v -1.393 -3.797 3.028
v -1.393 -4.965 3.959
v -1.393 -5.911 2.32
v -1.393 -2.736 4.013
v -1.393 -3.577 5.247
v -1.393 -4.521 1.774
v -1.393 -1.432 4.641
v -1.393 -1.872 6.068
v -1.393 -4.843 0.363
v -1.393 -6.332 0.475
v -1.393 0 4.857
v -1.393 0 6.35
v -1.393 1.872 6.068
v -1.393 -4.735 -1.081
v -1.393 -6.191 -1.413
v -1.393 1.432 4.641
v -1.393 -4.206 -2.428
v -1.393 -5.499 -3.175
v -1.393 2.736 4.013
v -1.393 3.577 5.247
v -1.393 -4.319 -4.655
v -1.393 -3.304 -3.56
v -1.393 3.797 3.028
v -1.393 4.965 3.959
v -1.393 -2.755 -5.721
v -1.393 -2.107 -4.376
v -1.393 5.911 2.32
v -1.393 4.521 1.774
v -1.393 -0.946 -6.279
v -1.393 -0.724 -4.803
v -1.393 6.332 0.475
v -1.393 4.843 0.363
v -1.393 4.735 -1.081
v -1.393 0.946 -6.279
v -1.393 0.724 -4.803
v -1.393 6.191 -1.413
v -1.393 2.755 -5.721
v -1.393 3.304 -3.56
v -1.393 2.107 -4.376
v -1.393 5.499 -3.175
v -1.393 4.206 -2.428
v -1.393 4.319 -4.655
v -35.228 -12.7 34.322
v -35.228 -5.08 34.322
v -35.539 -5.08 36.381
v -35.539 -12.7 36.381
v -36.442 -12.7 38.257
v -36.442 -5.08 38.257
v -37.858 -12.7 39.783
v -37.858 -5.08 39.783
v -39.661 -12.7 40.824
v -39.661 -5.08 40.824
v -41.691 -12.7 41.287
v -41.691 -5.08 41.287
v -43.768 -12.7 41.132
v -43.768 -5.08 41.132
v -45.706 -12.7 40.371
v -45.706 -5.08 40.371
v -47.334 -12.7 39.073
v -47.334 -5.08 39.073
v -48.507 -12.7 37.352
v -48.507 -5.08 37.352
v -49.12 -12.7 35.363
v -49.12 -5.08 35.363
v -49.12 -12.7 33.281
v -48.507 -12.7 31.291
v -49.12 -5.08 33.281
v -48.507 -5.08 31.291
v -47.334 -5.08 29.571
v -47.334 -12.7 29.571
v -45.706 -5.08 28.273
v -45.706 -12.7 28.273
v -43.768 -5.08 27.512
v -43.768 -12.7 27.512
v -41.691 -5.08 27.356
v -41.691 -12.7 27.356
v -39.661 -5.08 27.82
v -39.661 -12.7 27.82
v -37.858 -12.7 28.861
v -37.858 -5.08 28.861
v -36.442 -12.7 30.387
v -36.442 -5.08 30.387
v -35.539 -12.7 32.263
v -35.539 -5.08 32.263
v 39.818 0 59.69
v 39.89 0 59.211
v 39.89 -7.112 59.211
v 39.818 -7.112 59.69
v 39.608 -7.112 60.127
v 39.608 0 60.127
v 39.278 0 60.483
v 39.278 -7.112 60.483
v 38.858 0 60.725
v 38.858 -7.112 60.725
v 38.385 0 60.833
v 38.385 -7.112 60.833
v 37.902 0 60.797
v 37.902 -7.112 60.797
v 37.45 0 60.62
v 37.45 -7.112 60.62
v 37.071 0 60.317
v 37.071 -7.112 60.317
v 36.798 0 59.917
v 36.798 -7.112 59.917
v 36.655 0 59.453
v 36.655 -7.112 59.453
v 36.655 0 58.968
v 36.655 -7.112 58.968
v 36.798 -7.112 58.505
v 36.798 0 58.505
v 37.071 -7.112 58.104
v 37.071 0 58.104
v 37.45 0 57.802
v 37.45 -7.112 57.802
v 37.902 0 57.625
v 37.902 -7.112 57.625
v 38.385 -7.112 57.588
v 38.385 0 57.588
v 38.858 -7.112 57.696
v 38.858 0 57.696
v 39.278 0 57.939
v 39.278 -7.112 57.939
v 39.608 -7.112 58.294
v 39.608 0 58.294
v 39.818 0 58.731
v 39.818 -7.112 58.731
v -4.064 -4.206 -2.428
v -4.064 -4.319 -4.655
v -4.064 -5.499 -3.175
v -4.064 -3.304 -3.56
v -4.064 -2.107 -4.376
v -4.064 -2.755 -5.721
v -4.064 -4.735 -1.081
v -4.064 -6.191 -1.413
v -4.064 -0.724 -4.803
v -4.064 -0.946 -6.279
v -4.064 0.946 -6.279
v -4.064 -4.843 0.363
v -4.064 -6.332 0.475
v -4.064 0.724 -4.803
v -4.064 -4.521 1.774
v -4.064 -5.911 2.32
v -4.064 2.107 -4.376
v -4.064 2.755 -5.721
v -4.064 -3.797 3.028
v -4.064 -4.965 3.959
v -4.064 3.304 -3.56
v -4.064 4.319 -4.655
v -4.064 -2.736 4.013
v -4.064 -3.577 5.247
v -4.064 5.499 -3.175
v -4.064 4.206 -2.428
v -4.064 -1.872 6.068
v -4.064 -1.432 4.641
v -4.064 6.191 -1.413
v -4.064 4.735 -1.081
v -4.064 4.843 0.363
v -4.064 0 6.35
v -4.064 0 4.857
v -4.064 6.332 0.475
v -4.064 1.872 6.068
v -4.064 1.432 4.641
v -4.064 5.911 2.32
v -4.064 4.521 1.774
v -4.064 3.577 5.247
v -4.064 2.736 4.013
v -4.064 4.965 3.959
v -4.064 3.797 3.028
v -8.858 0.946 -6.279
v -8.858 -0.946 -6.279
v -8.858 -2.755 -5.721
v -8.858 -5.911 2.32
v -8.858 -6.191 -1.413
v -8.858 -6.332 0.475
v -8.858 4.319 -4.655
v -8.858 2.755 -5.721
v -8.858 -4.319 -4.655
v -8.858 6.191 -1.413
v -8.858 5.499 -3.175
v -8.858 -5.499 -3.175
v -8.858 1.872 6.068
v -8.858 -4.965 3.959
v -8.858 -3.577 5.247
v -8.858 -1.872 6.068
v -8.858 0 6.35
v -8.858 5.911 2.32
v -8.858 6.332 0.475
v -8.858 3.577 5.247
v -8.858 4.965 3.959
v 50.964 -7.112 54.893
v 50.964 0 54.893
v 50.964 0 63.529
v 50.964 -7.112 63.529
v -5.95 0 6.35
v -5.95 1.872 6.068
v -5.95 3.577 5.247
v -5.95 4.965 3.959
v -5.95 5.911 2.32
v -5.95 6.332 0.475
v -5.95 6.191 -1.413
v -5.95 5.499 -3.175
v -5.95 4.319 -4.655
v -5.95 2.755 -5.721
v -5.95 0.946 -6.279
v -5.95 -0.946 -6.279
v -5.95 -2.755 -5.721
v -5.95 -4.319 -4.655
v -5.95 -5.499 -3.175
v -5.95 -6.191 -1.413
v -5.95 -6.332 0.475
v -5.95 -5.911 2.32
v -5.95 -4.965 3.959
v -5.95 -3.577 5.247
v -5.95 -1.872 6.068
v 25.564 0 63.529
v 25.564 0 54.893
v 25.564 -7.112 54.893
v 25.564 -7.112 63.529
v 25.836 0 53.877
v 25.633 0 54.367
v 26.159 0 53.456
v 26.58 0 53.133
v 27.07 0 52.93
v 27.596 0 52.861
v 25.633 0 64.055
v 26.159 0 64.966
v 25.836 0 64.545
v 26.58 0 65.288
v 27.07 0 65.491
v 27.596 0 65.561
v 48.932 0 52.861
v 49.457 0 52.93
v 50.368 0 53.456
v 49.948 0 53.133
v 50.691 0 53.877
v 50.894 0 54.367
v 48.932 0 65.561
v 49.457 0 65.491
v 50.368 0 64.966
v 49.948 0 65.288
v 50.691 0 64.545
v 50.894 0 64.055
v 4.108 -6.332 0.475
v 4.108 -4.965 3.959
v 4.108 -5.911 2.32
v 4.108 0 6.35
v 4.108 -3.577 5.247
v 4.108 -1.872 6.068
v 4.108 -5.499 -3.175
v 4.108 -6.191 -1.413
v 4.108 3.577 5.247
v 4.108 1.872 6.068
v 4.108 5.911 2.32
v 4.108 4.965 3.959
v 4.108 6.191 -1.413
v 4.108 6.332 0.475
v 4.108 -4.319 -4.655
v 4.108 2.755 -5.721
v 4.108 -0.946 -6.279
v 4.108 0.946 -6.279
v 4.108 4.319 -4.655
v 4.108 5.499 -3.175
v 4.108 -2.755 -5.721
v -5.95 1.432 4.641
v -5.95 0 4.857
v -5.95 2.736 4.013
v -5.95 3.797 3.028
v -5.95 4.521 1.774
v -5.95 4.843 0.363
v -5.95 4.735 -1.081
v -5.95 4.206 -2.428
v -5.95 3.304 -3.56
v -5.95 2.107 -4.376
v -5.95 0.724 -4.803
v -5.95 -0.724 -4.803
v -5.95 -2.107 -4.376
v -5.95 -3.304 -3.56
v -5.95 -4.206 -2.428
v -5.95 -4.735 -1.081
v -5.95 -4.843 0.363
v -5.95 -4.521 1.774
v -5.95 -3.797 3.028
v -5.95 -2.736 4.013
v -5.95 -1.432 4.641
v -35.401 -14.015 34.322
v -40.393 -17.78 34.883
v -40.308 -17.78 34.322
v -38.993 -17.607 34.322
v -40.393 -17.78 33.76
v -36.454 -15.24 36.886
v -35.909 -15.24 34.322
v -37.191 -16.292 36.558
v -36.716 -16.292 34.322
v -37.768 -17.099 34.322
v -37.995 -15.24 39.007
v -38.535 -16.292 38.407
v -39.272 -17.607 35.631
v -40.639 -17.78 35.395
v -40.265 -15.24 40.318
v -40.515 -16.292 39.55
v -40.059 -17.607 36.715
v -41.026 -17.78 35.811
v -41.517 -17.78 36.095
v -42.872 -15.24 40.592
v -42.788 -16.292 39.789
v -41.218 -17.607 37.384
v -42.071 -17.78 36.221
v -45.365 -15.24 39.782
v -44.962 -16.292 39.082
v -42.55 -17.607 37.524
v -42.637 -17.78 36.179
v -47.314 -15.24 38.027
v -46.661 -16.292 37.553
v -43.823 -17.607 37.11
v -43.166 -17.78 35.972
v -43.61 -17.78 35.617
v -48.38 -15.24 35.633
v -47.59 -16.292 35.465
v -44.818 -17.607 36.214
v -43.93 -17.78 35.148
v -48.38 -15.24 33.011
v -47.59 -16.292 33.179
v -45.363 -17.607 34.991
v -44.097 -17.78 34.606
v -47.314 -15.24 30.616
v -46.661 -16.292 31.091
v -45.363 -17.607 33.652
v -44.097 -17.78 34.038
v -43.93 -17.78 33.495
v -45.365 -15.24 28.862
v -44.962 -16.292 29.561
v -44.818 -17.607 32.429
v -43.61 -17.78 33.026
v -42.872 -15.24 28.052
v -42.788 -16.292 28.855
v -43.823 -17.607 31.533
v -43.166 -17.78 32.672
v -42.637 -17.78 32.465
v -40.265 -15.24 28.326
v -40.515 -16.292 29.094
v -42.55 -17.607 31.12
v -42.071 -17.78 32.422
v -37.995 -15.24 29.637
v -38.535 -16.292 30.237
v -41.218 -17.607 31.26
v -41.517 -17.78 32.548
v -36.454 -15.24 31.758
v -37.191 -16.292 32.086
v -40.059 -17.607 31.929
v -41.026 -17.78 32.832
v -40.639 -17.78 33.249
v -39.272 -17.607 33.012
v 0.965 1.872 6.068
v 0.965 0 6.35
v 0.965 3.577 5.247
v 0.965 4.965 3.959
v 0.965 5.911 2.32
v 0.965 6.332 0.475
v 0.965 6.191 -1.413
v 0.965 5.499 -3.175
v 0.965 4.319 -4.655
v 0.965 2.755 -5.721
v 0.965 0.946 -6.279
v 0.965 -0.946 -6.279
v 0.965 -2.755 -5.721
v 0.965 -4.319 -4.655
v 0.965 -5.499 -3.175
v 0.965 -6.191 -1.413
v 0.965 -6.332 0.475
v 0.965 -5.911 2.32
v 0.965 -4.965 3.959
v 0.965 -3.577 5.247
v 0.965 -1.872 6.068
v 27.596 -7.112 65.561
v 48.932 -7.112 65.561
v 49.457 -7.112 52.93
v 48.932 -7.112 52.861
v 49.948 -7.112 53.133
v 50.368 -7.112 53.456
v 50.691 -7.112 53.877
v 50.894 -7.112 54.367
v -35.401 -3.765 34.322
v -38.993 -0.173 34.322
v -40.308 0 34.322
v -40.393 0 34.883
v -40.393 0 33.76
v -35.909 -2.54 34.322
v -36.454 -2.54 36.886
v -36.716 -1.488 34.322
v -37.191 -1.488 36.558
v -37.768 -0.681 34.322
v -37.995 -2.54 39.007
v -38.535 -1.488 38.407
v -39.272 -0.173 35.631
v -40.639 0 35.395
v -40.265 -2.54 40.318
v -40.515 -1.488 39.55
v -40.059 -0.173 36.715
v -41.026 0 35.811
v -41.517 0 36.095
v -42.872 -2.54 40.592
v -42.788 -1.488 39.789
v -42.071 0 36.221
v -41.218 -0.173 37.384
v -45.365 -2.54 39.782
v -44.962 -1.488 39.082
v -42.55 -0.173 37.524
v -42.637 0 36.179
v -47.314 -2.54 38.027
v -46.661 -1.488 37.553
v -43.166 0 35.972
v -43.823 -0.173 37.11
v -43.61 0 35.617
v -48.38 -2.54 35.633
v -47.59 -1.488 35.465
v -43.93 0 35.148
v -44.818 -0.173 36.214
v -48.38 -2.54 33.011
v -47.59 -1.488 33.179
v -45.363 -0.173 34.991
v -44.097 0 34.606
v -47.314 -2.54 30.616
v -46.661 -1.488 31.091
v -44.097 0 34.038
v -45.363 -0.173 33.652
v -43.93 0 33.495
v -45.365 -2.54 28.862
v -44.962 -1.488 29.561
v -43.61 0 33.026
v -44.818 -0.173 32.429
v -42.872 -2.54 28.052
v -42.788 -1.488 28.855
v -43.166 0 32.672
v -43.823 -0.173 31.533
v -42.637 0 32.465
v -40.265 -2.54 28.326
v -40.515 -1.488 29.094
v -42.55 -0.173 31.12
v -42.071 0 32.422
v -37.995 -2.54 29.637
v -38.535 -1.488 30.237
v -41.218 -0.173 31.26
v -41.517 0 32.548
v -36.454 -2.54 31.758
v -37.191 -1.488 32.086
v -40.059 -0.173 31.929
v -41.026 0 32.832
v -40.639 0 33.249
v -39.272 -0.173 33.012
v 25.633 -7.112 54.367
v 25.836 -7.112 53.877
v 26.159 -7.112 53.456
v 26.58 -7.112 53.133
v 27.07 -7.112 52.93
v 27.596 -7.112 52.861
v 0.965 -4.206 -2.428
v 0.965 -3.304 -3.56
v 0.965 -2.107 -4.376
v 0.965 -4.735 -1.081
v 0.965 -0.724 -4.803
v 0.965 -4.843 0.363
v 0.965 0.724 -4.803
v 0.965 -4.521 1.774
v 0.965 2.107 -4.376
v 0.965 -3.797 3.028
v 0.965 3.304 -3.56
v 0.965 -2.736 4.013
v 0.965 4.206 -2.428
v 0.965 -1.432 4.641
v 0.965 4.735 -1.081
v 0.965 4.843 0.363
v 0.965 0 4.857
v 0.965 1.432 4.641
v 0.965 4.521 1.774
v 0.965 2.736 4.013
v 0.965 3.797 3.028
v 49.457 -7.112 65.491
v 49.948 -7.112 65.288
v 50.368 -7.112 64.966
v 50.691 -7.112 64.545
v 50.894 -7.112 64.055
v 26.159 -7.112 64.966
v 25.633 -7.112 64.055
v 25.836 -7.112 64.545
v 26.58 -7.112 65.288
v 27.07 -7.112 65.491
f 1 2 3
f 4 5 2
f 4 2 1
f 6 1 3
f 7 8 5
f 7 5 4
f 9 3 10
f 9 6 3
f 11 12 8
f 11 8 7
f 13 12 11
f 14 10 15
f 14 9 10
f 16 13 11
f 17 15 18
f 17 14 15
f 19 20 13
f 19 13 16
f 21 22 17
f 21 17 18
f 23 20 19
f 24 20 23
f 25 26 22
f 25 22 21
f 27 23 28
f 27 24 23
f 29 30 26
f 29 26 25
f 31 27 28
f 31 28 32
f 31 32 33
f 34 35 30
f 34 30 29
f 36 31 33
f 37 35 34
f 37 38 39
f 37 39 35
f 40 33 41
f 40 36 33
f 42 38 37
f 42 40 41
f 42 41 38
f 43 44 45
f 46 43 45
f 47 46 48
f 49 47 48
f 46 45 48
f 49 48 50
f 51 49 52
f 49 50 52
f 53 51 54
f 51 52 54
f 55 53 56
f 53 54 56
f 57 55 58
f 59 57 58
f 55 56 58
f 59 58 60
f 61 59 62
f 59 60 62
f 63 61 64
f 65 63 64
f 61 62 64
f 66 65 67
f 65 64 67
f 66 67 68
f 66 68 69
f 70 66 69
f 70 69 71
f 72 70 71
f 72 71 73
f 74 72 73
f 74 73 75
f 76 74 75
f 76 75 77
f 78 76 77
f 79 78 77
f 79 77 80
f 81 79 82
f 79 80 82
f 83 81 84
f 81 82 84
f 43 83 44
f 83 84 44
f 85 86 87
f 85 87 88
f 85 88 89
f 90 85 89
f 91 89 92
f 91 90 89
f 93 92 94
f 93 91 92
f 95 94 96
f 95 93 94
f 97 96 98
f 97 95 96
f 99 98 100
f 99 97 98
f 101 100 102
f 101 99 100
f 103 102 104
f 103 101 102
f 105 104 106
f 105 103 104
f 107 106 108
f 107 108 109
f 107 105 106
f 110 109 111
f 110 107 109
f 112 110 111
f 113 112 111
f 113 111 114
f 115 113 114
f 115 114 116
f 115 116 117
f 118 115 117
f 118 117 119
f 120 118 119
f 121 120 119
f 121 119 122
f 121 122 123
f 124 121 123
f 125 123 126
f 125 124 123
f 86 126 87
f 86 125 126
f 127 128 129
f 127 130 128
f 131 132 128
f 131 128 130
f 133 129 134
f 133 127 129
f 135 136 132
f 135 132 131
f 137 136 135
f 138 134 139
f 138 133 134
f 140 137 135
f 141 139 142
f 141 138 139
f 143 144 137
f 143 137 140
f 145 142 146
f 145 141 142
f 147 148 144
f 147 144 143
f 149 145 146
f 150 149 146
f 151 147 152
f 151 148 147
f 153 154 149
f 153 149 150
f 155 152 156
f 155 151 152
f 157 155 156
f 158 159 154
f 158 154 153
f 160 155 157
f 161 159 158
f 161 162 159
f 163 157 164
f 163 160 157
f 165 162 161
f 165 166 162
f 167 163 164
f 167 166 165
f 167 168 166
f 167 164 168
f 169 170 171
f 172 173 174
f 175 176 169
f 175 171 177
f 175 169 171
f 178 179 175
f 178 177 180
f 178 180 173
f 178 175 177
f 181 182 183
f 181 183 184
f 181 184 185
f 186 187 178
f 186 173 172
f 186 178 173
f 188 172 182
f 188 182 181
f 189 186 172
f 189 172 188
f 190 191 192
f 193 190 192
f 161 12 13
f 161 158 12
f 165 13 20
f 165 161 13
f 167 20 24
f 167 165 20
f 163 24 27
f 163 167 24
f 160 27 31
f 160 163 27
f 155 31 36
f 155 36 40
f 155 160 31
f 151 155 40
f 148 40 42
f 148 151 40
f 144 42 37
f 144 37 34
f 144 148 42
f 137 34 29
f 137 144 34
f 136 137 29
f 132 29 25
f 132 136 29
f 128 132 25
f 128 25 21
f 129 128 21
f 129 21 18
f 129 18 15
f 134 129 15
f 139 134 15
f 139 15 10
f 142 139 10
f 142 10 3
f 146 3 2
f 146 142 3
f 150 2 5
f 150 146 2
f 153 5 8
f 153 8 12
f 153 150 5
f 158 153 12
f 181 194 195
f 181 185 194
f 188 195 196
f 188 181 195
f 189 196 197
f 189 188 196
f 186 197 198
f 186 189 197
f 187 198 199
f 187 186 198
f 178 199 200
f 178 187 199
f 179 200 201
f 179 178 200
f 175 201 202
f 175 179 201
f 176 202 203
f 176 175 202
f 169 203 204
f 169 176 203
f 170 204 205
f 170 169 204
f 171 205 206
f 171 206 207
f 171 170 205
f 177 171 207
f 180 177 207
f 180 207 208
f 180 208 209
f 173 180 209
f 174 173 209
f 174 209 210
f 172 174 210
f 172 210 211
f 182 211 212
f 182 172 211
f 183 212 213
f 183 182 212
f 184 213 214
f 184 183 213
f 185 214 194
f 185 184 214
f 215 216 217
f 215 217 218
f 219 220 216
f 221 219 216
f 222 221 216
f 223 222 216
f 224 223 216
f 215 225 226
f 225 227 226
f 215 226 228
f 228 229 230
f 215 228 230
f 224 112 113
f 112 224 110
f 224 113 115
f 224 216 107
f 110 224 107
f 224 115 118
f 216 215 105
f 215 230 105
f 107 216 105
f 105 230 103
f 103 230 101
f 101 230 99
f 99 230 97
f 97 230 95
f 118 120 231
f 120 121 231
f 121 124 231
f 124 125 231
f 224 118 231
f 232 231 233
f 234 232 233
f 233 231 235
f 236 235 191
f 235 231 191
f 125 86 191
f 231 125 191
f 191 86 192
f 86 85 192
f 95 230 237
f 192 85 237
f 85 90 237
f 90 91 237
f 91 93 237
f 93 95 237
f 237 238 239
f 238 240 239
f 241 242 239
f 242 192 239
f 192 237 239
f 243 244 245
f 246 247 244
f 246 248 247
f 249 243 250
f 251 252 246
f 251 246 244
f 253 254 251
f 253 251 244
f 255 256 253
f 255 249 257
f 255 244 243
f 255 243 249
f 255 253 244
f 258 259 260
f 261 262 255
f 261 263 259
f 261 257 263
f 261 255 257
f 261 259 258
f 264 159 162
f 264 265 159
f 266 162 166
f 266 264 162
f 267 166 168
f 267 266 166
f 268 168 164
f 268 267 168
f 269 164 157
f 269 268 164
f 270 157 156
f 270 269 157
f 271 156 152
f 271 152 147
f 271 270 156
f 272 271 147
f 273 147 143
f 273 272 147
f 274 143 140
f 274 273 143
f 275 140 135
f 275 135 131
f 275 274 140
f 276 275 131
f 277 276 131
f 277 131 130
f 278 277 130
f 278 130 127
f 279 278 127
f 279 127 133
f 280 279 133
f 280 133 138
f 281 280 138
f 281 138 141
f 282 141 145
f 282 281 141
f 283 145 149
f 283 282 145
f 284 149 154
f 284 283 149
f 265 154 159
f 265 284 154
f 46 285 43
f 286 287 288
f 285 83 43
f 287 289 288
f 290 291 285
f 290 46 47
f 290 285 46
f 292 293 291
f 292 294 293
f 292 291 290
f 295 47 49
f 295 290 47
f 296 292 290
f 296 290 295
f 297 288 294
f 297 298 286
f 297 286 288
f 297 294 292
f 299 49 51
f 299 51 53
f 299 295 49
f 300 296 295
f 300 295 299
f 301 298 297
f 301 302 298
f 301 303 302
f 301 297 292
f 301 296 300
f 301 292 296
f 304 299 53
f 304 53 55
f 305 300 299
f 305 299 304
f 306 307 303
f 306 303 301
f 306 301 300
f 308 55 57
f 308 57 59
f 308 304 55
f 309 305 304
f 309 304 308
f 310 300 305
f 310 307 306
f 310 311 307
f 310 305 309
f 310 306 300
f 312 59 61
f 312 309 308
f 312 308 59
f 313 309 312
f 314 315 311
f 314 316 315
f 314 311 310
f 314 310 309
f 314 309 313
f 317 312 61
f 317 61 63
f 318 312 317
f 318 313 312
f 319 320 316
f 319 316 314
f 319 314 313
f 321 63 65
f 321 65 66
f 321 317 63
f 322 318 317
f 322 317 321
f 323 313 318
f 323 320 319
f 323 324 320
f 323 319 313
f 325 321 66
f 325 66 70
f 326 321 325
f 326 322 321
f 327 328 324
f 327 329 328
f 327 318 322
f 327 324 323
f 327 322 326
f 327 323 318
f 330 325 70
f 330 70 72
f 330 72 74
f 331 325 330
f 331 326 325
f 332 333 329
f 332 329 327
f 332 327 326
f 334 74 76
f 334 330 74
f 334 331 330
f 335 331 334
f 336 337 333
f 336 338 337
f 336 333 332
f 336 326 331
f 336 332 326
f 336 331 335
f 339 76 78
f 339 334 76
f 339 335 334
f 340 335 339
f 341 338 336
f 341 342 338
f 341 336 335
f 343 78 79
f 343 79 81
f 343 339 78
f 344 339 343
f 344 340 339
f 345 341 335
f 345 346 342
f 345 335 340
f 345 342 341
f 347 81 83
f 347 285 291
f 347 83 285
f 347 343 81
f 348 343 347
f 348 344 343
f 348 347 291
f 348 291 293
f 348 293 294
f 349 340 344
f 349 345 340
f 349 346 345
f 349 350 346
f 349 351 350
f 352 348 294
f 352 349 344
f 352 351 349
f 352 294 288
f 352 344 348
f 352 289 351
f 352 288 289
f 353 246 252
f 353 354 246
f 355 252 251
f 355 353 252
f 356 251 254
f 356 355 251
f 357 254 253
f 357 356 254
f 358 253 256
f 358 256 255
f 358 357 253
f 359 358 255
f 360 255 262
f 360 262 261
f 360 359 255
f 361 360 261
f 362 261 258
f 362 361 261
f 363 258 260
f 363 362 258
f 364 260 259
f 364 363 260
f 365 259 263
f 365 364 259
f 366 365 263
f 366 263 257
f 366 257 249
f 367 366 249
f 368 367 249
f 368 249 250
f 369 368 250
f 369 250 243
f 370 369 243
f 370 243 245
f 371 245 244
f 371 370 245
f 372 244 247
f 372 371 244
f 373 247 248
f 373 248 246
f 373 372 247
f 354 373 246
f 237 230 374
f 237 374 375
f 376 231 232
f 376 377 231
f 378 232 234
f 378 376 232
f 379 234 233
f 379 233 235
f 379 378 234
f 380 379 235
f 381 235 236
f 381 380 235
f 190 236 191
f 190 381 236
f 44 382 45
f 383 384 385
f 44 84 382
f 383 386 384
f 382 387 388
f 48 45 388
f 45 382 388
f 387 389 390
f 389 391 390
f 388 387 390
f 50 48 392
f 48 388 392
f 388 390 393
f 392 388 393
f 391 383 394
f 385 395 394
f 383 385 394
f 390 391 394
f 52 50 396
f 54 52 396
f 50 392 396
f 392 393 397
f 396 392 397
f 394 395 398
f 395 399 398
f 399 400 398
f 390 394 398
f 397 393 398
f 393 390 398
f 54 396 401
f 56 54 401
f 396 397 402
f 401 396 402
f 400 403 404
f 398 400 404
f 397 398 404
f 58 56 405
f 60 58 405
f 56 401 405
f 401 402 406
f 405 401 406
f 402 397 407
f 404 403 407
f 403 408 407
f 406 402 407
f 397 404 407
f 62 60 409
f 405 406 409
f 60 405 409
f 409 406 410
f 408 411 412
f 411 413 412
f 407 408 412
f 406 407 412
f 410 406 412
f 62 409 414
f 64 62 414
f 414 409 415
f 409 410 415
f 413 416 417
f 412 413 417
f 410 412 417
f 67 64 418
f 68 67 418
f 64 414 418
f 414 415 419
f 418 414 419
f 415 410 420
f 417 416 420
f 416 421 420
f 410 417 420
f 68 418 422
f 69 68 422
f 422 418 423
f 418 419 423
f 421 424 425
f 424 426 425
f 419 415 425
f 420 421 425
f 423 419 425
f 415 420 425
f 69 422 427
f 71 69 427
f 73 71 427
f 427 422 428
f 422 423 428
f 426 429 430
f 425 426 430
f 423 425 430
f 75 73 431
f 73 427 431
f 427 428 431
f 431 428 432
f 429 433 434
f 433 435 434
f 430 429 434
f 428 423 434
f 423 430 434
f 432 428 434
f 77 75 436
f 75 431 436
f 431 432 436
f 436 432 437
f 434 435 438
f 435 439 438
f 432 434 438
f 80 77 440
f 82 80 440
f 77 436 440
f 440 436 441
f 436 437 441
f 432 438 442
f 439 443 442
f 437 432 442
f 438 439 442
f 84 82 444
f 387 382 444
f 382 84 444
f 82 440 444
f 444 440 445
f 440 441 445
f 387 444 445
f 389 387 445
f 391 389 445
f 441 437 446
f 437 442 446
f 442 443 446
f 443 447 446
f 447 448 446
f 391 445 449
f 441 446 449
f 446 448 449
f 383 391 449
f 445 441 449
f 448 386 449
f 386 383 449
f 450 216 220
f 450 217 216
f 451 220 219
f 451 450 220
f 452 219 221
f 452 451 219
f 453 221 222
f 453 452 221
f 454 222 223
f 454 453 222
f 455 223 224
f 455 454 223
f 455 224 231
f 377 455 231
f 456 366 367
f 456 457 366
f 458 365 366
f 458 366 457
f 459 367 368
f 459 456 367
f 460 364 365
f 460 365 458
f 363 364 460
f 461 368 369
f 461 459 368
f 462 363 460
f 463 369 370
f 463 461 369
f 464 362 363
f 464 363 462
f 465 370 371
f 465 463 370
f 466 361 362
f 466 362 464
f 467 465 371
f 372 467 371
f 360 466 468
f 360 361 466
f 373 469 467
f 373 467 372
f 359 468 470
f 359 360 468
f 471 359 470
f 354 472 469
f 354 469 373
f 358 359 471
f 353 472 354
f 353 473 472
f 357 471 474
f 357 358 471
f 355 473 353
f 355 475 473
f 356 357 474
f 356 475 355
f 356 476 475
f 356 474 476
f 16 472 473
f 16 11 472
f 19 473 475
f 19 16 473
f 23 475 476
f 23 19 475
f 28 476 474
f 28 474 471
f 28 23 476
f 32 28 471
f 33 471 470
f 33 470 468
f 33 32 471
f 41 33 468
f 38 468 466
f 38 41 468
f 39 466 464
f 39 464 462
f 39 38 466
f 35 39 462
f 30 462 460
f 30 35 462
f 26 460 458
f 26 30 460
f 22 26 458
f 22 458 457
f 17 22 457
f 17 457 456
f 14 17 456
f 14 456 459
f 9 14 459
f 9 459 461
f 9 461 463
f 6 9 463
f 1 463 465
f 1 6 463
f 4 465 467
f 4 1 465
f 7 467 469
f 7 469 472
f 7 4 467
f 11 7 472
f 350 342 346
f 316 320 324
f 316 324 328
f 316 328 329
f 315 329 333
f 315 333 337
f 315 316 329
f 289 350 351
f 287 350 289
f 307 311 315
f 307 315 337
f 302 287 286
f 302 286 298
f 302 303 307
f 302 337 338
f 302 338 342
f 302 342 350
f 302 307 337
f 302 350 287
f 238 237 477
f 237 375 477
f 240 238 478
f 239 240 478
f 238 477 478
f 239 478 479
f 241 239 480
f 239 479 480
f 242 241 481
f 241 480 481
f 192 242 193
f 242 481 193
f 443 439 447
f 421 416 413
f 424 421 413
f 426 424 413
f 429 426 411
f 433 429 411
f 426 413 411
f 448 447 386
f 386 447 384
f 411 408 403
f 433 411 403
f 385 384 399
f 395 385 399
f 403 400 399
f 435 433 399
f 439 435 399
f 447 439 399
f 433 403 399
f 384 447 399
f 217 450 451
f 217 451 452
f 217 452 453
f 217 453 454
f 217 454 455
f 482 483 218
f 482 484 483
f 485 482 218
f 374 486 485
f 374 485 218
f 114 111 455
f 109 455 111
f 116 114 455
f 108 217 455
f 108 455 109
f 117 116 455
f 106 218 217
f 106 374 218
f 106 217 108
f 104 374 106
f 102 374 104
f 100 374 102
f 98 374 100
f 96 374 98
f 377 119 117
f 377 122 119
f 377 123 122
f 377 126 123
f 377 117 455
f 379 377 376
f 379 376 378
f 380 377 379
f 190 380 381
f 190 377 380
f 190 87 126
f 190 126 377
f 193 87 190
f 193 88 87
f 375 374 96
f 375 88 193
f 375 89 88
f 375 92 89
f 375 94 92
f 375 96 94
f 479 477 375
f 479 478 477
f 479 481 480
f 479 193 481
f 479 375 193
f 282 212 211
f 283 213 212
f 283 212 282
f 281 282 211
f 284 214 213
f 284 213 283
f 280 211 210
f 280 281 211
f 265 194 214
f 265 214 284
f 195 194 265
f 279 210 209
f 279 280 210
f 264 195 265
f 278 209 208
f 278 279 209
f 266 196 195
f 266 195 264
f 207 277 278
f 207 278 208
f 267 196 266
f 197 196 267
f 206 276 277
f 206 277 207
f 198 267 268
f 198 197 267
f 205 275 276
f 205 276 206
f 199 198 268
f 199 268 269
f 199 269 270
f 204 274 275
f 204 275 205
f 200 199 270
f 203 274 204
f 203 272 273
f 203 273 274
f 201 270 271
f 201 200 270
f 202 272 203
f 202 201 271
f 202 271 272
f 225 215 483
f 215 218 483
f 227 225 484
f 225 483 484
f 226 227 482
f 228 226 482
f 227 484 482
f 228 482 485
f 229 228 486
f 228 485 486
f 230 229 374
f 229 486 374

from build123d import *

# Parameters (mm, degrees)
F2_R     = 6.985
F3_DEPTH = 17.78
F4_R     = 5.08
F5_W     = 25.4
F5_H     = 12.7
F5_R     = 1.626873
F6_DEPTH = 7.112
F7_R     = 2.032


with BuildPart() as f1:
    # F0 (on Front) → F1 (revolve)
    with BuildSketch(Plane.XZ):
        Polygon((-8.857762, 6.35), (-8.857762, 0), (4.108202, 0), (4.108202, 6.35), (0.964937, 6.35), (0.964937, 4.85695), (-1.392511, 4.85695), (-1.392511, 6.35), (-4.064285, 6.35), (-4.064285, 4.85695), (-5.950243, 4.85695), (-5.950243, 6.35), align=None)
    revolve(axis=Axis((-2.37478, 0, 0), (-1, 0, 0)))


with BuildPart() as f3:
    # F2 (on Front) → F3 (new body)
    with BuildSketch(Plane.XZ):
        with Locations((-42.213276, 34.321759)):
            Circle(F2_R)
    extrude(amount=F3_DEPTH)

    # F4
    f4_edges = [f3.edges().sort_by_distance(p)[0] for p in [
        (-49.198276, -17.78, 34.321759),
        (-49.198276, 0, 34.321759),
    ]]
    fillet(f4_edges, radius=F4_R)


with BuildPart() as f6:
    # F5 (on Front) → F6 (new body)
    with BuildSketch(Plane.XZ):
        with Locations((38.263551, 59.210708)):
            Rectangle(F5_W, F5_H)
        with Locations((38.263551, 59.210708)):
            Circle(F5_R, mode=Mode.SUBTRACT)
    extrude(amount=F6_DEPTH)

    # F7
    f7_edges = [f6.edges().sort_by_distance(p)[0] for p in [
        (50.963551, -3.556, 65.560708),
        (25.563551, -3.556, 65.560708),
        (25.563551, -3.556, 52.860708),
        (50.963551, -3.556, 52.860708),
    ]]
    fillet(f7_edges, radius=F7_R)


solid = Compound([f1.part, f3.part, f6.part])
